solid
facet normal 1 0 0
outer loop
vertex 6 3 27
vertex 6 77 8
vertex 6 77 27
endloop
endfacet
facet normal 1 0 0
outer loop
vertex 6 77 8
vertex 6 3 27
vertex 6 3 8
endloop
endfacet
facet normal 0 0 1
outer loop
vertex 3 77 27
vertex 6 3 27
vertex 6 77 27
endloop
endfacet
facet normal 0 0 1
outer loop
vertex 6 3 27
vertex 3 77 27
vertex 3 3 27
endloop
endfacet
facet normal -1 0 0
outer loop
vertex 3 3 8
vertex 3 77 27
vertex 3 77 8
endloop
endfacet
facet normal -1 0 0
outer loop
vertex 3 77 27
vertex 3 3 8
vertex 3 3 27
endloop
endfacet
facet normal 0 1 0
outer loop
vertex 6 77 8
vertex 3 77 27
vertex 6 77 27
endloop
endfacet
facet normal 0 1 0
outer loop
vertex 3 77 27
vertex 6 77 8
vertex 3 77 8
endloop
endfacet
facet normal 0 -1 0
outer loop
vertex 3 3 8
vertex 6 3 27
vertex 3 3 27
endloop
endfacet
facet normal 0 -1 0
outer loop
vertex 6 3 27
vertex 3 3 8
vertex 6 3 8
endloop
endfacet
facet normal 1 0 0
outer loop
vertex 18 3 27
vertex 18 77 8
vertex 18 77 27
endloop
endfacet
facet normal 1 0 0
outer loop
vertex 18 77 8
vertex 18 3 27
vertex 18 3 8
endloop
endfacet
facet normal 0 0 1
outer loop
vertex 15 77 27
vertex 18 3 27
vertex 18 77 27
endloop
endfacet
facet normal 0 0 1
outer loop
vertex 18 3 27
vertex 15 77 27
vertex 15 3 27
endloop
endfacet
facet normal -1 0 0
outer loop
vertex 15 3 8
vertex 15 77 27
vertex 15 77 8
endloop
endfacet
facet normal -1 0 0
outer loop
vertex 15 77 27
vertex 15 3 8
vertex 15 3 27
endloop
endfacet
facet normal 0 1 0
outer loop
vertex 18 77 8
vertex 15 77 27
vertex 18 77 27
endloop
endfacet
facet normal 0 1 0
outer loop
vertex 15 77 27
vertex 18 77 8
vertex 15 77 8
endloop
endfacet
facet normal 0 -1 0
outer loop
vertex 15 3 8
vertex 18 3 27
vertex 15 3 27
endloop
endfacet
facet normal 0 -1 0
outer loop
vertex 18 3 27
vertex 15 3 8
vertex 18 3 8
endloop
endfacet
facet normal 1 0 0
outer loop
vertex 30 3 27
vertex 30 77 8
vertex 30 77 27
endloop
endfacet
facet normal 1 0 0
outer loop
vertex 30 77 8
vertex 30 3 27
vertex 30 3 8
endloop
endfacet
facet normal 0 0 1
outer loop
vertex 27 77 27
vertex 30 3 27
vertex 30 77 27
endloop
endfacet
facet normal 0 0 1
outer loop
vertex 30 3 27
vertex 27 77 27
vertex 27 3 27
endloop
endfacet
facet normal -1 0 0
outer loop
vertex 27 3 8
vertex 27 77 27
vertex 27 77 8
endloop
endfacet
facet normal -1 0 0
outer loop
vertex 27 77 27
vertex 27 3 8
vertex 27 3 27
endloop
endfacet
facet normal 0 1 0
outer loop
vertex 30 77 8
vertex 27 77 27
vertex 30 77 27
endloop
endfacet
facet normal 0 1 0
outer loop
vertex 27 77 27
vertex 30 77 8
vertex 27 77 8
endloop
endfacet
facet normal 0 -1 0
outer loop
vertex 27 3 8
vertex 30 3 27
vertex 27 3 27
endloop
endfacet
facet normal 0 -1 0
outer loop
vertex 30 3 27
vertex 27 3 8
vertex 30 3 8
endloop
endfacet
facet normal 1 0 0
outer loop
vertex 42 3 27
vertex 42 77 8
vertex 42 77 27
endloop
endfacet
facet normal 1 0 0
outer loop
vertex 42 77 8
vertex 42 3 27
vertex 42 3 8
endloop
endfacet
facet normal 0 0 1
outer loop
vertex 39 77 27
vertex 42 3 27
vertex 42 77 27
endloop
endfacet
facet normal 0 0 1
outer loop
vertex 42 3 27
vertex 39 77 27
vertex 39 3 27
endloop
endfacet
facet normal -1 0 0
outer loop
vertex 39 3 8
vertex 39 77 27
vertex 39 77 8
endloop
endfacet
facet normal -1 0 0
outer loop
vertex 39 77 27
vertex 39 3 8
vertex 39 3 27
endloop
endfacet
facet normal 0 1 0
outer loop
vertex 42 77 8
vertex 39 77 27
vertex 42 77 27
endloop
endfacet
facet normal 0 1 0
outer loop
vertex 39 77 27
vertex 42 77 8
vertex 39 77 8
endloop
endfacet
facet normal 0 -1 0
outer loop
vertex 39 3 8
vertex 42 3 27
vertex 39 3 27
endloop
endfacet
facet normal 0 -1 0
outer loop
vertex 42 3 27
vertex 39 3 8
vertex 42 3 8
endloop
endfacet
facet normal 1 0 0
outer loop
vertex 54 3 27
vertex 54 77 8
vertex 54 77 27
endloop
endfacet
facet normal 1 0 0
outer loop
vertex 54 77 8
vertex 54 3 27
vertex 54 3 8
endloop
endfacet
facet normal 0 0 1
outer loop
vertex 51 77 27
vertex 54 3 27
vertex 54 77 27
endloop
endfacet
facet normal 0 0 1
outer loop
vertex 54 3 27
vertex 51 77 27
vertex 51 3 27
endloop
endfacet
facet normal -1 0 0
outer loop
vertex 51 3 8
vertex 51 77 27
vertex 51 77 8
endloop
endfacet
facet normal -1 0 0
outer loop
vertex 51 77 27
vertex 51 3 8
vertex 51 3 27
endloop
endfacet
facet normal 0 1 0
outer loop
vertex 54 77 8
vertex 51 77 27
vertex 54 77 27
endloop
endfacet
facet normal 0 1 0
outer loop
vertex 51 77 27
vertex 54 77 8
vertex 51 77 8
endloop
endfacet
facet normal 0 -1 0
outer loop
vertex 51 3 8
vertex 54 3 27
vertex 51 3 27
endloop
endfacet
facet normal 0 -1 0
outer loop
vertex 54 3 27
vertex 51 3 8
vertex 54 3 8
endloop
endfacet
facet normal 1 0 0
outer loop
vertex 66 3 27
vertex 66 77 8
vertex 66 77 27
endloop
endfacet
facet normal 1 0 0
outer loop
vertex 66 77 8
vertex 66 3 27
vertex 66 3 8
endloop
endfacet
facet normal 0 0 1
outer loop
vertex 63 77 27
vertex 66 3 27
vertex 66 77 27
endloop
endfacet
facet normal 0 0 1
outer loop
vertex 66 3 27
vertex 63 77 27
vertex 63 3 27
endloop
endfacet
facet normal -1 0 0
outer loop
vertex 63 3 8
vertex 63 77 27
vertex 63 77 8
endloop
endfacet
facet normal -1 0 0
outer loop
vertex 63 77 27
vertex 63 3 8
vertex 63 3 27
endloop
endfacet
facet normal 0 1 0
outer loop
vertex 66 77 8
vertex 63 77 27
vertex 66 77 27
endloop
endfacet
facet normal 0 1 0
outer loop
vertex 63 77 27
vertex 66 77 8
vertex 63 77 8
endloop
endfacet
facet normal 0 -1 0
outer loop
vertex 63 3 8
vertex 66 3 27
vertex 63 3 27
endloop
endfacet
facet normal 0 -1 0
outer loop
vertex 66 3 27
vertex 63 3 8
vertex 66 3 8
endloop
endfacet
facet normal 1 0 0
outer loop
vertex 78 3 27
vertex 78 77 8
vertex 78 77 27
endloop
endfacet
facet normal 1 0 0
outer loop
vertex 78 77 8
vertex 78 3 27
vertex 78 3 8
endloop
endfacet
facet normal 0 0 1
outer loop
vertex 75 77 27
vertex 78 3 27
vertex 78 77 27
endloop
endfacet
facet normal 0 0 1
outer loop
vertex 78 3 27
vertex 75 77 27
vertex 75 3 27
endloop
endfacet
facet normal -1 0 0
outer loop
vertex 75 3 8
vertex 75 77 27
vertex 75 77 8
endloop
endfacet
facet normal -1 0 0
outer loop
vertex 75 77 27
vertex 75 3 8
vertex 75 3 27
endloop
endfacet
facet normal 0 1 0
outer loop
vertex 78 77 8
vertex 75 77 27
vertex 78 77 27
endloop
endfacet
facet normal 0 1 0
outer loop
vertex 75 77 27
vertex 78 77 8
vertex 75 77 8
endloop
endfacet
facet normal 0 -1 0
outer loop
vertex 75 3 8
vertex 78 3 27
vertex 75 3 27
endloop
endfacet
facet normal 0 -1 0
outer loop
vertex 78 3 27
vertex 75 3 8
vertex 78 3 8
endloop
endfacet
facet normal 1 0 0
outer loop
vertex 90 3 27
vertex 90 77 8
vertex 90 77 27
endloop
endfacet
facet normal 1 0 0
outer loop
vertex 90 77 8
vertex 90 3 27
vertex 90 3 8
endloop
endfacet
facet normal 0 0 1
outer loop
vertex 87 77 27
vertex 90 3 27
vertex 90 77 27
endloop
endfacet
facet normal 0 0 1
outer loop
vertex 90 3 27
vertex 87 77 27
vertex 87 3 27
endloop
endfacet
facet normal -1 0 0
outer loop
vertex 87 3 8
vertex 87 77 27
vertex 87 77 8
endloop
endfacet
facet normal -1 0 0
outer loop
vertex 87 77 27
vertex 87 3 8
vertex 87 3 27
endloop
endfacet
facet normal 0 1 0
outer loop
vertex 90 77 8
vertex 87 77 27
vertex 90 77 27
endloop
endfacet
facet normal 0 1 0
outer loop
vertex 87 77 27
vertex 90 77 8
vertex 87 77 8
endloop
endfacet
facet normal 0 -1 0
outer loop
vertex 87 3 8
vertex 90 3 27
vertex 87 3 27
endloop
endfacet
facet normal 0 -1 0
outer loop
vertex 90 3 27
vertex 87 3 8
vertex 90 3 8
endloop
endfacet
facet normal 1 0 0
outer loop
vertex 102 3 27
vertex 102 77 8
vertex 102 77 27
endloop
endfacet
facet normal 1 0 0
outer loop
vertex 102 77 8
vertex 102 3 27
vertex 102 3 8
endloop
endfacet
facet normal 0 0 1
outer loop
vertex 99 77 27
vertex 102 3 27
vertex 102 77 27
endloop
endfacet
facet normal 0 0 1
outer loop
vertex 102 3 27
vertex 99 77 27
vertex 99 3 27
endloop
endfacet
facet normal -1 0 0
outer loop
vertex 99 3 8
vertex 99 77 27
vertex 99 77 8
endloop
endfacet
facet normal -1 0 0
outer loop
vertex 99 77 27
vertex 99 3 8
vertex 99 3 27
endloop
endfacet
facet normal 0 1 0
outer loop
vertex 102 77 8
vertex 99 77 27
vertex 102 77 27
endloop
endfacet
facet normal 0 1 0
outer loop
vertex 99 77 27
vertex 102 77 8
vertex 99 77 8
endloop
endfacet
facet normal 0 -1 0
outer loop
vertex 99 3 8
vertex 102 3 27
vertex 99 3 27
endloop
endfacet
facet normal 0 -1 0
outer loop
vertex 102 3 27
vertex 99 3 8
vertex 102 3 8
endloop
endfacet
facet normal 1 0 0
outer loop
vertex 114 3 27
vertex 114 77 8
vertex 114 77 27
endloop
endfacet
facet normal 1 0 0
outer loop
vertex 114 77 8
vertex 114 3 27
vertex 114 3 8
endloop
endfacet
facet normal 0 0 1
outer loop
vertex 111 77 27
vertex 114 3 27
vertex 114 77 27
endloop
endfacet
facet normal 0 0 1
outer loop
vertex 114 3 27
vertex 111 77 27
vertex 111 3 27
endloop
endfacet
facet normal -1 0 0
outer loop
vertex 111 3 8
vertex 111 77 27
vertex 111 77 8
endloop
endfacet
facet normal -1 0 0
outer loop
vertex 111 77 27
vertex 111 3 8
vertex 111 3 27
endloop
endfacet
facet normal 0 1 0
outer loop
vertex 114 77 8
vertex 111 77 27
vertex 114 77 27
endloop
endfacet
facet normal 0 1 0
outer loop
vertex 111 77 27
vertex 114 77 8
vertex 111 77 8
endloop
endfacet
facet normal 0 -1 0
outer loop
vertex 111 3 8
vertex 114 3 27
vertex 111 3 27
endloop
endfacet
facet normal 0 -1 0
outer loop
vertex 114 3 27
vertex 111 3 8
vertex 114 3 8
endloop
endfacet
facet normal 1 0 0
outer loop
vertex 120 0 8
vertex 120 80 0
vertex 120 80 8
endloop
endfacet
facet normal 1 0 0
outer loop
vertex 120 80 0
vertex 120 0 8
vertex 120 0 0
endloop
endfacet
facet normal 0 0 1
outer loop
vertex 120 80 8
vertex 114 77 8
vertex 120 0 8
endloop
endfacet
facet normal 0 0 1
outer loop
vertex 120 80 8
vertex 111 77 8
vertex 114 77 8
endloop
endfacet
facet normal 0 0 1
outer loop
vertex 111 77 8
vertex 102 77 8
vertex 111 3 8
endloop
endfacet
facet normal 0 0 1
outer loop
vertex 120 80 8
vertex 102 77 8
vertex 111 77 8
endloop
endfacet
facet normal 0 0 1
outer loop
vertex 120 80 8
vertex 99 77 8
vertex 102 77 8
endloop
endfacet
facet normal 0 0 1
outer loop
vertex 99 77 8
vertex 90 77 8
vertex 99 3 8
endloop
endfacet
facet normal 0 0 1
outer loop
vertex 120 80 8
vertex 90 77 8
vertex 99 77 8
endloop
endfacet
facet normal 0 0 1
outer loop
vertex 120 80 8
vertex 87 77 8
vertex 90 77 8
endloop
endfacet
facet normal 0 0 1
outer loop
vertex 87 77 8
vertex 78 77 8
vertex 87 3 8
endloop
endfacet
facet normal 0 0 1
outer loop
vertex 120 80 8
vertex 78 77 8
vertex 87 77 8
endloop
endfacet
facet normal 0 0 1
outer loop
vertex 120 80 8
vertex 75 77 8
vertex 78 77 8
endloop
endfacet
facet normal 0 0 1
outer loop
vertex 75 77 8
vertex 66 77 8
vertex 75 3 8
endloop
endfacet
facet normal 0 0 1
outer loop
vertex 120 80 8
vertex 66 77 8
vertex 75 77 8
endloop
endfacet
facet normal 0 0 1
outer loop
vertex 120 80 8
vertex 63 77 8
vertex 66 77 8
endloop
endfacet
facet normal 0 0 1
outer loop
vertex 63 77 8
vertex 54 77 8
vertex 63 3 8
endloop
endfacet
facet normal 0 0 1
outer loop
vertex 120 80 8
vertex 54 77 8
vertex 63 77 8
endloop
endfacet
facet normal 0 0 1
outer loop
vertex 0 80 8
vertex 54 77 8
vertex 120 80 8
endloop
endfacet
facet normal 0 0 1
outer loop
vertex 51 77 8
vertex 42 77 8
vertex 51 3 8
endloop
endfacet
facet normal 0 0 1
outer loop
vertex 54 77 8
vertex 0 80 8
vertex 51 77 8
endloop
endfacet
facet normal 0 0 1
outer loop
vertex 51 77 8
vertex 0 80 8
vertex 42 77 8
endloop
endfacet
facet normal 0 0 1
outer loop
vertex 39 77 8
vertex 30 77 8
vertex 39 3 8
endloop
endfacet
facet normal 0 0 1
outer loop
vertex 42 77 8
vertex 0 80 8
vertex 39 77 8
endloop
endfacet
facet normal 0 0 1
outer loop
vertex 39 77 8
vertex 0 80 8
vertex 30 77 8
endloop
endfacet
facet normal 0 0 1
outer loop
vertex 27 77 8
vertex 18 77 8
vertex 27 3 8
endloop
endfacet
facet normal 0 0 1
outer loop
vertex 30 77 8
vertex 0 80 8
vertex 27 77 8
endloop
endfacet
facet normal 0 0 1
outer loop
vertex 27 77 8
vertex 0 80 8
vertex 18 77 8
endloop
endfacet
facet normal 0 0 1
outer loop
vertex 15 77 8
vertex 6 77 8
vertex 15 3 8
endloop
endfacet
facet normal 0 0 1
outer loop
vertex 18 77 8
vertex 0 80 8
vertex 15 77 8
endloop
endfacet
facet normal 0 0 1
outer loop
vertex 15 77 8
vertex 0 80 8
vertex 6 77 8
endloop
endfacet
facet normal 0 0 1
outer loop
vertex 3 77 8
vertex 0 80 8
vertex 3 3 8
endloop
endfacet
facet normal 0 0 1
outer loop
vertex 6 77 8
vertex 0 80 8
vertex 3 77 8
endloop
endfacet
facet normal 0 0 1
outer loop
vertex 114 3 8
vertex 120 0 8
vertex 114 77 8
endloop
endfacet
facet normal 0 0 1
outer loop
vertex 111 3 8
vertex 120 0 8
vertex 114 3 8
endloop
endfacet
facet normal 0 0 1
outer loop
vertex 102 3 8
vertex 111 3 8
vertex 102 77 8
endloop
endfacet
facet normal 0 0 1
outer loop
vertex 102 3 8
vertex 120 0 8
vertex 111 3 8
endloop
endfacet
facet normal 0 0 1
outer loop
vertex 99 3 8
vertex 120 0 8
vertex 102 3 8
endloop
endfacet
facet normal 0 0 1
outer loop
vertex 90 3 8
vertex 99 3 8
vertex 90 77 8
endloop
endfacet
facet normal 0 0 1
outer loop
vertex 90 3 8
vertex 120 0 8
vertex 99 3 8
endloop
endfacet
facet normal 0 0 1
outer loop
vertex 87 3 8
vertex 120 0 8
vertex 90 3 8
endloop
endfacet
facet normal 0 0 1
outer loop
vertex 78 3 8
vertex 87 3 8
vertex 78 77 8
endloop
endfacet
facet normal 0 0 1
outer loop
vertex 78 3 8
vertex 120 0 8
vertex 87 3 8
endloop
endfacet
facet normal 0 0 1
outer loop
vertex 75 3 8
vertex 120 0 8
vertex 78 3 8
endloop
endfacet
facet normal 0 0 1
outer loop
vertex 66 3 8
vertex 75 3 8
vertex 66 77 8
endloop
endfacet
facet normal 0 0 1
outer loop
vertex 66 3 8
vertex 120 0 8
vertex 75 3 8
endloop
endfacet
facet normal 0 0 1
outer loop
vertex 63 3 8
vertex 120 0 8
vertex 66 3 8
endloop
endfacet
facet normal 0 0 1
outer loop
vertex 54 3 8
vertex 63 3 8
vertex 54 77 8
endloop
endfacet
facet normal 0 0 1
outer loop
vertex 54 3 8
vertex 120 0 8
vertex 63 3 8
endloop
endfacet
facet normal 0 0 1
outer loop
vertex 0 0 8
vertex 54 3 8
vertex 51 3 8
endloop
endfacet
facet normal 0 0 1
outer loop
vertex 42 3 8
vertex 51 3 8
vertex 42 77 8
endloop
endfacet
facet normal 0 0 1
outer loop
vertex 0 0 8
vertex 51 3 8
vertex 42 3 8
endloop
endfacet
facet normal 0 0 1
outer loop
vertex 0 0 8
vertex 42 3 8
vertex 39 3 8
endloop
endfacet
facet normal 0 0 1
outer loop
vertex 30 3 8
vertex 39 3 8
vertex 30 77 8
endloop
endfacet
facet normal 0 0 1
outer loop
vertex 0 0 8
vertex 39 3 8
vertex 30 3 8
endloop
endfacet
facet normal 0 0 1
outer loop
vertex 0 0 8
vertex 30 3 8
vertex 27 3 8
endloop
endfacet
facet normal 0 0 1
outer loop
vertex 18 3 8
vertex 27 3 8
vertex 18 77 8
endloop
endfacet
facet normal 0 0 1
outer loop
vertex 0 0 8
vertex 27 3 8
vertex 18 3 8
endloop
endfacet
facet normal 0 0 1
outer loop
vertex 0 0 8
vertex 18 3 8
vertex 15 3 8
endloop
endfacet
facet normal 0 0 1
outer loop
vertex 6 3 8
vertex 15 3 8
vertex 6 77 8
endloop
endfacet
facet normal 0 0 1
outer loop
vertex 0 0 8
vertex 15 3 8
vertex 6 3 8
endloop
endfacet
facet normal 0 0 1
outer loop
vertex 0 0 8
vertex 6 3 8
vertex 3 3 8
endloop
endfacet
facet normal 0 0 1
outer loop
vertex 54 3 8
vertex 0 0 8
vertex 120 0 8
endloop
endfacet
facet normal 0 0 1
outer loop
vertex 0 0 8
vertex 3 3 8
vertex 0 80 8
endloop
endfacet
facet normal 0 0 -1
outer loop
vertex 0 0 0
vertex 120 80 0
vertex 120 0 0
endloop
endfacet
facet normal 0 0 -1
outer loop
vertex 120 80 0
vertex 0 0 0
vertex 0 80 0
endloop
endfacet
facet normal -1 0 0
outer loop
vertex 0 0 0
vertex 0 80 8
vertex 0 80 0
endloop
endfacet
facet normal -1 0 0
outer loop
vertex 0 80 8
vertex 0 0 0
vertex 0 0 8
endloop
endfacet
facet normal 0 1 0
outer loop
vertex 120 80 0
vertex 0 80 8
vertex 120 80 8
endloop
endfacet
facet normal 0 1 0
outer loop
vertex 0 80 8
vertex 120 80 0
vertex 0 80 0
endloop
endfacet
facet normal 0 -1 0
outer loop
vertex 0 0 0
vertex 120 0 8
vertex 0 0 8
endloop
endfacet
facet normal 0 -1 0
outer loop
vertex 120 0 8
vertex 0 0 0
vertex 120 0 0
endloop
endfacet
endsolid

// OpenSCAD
$fn = 32;

// ----------------------------------------------------------------------
// Heatsink: uniform fin block
// ----------------------------------------------------------------------

// --- parameters (mm) ---
base_l = 120;             // base length, X
base_w = 80;              // base width, Y
base_t = 8;               // base plate thickness
fin_h = 20;               // fin height above the base
fin_t = 3;                // fin thickness
edge = 3;                 // margin from the base ends
pitch = 12;               // fin pitch
fit_tol = 0.1;            // tolerance for press fits, mm
free_tol = 0.3;           // tolerance for clearance fits, mm

n_fins = floor((base_l - 2 * edge - fin_t) / pitch) + 1;  // fin count
total_h = base_t + fin_h - 1;  // overall height

union() {
  cube([base_l, base_w, base_t]);
  for (i = [0 : n_fins - 1])
    translate([edge + i * pitch, edge, base_t - 1])
      cube([fin_t, base_w - 2 * edge, fin_h]);
}
